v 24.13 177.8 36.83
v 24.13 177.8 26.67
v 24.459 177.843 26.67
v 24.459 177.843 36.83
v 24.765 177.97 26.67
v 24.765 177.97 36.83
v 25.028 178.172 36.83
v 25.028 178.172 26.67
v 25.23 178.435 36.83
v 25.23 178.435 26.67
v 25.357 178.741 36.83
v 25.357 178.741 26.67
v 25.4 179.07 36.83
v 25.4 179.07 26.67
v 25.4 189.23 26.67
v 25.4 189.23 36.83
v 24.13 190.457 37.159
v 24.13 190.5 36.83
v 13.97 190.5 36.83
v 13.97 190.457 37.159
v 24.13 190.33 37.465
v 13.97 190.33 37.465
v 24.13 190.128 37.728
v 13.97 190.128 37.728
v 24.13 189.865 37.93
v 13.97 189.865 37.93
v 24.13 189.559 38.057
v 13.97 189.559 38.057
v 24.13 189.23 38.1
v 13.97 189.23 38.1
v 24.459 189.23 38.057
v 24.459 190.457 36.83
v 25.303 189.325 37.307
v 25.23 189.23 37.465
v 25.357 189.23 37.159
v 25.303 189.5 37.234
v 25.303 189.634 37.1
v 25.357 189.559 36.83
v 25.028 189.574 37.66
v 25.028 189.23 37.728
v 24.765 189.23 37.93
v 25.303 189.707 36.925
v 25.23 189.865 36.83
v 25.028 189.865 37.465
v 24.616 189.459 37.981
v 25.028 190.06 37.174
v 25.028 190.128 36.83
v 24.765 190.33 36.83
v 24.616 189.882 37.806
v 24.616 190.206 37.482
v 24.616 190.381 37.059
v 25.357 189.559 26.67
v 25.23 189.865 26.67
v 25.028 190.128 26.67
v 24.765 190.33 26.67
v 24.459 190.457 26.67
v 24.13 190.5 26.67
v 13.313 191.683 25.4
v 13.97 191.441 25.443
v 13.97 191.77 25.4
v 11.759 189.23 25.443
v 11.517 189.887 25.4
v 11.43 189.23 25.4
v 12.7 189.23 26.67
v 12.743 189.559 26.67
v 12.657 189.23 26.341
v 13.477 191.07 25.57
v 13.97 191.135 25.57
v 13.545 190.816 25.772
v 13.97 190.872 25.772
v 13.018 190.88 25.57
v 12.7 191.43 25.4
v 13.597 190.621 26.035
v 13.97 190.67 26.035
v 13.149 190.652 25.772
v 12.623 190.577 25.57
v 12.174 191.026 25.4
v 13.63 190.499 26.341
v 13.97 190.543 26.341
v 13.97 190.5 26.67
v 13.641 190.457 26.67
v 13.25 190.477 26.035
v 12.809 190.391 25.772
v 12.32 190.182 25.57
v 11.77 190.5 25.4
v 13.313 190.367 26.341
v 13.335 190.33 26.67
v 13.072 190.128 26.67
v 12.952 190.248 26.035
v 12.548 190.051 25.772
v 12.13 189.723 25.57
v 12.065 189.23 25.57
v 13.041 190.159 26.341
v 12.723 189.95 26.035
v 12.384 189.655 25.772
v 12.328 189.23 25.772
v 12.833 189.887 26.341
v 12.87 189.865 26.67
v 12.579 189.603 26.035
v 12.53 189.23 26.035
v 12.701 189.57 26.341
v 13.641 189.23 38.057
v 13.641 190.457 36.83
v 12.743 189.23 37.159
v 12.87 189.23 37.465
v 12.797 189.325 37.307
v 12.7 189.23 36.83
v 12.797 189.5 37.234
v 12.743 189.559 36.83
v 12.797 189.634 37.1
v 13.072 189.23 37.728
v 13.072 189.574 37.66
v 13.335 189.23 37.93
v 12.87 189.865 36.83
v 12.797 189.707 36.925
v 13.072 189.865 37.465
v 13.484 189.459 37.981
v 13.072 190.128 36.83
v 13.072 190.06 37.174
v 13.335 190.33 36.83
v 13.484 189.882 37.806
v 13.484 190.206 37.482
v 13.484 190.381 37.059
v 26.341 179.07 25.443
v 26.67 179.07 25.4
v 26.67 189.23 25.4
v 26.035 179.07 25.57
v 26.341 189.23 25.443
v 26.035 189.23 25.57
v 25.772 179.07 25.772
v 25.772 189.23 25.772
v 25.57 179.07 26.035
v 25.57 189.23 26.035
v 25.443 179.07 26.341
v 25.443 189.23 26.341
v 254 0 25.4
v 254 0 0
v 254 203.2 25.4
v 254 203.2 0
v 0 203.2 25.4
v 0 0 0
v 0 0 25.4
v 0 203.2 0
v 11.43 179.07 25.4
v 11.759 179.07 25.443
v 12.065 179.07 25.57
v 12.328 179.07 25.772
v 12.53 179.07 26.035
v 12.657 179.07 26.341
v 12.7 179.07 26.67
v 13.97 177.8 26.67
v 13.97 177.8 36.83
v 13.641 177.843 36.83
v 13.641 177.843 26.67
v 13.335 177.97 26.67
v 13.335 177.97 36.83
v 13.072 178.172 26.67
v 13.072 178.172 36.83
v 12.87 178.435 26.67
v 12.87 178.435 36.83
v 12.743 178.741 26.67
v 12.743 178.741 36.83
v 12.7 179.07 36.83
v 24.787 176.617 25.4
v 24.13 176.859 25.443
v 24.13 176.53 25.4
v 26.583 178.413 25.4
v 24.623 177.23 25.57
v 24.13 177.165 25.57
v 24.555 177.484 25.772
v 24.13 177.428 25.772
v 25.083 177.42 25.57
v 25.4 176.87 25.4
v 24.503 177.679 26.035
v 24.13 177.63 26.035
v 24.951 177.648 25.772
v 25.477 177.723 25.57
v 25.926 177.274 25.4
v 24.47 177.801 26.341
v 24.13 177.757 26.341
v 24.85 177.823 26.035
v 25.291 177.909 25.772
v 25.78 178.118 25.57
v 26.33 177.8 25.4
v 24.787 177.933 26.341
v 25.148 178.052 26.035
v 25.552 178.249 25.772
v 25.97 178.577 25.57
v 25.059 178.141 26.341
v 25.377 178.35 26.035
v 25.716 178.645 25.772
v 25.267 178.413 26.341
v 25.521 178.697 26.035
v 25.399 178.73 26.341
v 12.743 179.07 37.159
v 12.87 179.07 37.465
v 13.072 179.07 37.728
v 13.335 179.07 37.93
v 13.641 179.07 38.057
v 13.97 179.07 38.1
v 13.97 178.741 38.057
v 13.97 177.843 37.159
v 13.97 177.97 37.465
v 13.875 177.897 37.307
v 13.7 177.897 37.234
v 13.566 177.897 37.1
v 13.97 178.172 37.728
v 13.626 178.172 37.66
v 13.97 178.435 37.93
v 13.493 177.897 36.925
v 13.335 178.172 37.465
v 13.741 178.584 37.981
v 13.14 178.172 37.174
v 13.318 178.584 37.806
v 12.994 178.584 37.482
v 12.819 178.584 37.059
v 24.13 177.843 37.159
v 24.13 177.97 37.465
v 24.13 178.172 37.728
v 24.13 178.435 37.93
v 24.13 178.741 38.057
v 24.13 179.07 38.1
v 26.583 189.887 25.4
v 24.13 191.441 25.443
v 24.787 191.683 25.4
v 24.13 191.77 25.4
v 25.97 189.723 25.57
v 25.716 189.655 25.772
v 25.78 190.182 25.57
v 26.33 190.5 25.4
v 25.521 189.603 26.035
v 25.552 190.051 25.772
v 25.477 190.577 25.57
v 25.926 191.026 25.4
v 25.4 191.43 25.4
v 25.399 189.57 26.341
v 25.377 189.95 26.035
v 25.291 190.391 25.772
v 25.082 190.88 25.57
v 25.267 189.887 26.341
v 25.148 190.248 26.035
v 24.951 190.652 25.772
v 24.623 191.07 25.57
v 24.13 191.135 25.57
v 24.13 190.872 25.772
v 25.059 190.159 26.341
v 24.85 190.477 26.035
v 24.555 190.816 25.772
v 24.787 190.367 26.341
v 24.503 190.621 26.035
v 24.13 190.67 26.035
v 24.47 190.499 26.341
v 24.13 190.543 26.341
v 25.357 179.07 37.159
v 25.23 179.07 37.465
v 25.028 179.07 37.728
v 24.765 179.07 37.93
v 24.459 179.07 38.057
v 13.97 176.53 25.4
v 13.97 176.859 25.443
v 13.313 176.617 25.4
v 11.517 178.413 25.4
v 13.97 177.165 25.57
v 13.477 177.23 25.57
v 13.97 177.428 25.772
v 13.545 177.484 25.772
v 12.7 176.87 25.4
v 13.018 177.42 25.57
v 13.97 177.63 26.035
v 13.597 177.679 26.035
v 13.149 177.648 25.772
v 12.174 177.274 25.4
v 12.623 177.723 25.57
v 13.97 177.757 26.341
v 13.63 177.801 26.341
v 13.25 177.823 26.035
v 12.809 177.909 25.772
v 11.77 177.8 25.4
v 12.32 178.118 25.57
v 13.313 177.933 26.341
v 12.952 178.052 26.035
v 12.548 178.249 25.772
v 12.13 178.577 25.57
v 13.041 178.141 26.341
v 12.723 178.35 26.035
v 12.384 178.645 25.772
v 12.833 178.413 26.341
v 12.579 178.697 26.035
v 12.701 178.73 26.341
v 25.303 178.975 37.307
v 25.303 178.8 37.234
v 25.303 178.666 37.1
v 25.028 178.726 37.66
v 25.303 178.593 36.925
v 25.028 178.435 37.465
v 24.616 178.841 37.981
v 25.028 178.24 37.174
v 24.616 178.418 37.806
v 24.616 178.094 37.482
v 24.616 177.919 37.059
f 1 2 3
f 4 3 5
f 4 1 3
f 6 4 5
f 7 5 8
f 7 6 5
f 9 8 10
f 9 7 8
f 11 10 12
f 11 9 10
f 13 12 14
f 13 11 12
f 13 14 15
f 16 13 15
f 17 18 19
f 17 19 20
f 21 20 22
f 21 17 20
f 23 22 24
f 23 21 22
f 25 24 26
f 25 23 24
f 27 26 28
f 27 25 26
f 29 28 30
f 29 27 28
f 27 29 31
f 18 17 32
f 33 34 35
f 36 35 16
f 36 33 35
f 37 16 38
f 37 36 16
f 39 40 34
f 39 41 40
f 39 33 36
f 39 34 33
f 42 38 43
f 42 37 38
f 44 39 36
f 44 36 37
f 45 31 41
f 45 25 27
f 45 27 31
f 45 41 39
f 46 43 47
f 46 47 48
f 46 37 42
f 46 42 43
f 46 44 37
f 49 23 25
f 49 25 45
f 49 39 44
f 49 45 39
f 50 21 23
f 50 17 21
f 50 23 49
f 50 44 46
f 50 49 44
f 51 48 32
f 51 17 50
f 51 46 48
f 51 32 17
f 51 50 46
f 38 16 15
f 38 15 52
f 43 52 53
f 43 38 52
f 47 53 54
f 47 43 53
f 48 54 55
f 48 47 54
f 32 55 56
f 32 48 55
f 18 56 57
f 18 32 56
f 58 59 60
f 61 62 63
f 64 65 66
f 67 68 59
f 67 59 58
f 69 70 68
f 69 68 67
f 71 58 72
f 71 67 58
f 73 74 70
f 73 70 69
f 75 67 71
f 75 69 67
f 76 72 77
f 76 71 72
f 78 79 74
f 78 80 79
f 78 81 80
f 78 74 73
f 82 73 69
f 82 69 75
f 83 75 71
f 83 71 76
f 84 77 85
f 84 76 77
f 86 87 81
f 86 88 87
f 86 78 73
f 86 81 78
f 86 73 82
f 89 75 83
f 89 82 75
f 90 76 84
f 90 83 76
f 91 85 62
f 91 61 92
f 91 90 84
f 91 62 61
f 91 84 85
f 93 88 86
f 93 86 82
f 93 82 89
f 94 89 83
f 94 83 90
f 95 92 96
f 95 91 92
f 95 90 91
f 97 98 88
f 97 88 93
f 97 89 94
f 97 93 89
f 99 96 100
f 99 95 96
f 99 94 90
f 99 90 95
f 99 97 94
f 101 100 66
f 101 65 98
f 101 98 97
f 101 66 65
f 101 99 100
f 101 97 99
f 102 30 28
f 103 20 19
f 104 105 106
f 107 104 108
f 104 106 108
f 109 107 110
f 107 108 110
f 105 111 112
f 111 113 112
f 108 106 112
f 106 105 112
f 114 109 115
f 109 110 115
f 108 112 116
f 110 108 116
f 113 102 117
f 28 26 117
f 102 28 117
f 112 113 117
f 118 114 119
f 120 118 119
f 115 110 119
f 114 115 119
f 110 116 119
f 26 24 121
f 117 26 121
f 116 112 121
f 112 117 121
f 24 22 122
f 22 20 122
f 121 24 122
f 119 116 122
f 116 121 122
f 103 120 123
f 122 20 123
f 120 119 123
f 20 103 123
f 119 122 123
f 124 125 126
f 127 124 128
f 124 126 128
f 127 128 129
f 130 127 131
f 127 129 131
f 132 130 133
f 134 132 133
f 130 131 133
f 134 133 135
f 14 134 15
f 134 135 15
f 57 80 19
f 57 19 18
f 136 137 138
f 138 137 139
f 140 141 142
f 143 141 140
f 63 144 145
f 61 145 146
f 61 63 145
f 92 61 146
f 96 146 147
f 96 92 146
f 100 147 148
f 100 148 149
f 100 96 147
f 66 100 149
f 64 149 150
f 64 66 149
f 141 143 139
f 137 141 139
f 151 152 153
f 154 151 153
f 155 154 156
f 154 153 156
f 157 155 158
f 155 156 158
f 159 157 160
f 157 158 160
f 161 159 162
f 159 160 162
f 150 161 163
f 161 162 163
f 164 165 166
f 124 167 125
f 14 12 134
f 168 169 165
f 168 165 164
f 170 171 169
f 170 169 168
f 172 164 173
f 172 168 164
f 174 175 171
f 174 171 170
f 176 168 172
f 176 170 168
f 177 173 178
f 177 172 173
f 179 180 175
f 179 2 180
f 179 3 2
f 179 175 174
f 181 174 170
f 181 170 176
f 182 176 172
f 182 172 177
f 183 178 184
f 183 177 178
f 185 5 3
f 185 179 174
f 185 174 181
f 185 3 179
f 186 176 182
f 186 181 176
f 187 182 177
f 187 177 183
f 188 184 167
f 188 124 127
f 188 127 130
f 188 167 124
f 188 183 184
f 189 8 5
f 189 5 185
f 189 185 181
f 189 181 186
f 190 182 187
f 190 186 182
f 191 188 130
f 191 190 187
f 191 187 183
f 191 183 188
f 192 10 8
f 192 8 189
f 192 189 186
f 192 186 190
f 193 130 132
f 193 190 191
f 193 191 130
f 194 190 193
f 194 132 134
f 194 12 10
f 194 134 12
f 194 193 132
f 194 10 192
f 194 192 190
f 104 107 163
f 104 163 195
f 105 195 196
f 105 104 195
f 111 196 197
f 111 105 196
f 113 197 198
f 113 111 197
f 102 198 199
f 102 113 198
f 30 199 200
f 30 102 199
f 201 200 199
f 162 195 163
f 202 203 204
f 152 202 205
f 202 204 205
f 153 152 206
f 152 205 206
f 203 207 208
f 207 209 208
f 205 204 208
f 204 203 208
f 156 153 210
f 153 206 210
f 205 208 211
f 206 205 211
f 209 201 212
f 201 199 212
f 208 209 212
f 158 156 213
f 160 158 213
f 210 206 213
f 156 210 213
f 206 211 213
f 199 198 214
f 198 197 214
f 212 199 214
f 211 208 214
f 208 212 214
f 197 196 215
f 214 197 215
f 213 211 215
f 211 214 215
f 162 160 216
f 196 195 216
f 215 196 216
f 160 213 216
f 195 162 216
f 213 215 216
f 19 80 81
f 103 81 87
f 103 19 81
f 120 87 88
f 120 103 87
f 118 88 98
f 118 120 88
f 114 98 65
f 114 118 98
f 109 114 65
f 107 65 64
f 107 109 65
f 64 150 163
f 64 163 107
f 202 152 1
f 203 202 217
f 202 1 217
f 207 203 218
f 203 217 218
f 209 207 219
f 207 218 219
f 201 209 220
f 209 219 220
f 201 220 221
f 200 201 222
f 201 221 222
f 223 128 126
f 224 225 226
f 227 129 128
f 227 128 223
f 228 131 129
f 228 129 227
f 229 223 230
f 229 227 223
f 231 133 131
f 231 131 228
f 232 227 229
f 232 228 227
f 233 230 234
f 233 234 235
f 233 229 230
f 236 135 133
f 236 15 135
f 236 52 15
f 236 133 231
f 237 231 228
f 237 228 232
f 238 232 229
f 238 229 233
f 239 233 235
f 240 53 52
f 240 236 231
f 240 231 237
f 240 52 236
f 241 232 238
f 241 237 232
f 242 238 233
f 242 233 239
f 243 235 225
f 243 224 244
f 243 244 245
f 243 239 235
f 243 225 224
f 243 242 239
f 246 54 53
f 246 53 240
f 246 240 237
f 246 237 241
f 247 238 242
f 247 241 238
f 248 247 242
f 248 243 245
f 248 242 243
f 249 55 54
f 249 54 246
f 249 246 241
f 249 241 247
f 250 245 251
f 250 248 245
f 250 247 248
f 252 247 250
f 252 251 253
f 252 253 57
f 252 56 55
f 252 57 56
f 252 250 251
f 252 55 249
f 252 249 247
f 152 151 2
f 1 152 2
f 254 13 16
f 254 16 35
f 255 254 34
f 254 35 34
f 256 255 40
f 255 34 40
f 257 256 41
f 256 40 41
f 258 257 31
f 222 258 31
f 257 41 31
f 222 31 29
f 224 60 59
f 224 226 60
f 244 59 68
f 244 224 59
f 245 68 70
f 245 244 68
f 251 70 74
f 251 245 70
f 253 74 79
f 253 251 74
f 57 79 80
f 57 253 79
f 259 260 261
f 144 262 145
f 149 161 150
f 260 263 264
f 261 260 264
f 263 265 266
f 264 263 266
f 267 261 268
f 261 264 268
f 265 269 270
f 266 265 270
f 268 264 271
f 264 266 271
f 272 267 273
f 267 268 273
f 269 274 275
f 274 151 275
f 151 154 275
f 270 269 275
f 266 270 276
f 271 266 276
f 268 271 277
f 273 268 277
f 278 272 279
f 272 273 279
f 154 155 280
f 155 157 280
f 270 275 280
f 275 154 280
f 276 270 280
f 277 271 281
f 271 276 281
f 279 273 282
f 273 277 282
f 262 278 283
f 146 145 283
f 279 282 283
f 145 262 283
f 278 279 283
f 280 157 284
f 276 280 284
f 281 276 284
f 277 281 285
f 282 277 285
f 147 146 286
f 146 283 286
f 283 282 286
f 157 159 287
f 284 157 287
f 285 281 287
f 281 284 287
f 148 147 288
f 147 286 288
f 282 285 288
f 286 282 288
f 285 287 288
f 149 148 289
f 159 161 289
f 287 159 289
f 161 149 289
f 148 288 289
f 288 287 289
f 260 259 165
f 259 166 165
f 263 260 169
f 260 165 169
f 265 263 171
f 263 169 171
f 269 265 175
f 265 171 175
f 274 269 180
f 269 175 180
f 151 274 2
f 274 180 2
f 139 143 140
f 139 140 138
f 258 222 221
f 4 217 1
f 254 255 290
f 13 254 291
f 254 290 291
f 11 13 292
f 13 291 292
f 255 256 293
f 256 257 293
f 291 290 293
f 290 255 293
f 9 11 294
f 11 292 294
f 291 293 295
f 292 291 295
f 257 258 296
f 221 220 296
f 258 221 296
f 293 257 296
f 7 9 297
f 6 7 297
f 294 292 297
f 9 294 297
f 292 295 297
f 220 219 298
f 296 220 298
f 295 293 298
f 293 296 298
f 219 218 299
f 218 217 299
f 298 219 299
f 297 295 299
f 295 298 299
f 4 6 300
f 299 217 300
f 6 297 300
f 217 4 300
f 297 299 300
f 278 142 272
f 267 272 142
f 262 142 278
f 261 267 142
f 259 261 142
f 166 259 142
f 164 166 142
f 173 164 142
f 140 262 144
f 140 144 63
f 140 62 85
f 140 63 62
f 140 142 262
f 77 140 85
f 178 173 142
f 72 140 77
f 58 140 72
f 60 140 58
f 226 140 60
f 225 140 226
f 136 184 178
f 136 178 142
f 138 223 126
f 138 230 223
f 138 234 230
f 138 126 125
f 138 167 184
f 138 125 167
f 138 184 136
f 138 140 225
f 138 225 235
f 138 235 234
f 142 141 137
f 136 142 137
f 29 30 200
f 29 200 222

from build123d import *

# Parameters (mm, degrees)
F0_W     = 254
F0_H     = 203.2
F1_DEPTH = 25.4
F2_W     = 12.7
F2_H     = 12.7
F3_DEPTH = 12.7
F4_R     = 1.27


with BuildPart() as f1:
    # F0 (on Top) → F1 (new body)
    with BuildSketch(Plane.XY):
        with Locations((127, 101.6)):
            Rectangle(F0_W, F0_H)
    extrude(amount=F1_DEPTH)

    # F2 (on face) → F3 (join)
    with BuildSketch(Plane.XY.offset(25.4)):
        with Locations((19.05, 184.15)):
            Rectangle(F2_W, F2_H)
    extrude(amount=F3_DEPTH)

    # F4
    f4_edges = [f1.edges().sort_by_distance(p)[0] for p in [
        (19.05, 177.8, 25.4),
        (25.4, 184.15, 25.4),
        (19.05, 190.5, 25.4),
        (12.7, 184.15, 25.4),
        (19.05, 190.5, 38.1),
        (12.7, 184.15, 38.1),
        (19.05, 177.8, 38.1),
        (25.4, 184.15, 38.1),
        (12.7, 177.8, 31.75),
        (25.4, 177.8, 31.75),
        (25.4, 190.5, 31.75),
        (12.7, 190.5, 31.75),
    ]]
    fillet(f4_edges, radius=F4_R)


solid = f1.part
